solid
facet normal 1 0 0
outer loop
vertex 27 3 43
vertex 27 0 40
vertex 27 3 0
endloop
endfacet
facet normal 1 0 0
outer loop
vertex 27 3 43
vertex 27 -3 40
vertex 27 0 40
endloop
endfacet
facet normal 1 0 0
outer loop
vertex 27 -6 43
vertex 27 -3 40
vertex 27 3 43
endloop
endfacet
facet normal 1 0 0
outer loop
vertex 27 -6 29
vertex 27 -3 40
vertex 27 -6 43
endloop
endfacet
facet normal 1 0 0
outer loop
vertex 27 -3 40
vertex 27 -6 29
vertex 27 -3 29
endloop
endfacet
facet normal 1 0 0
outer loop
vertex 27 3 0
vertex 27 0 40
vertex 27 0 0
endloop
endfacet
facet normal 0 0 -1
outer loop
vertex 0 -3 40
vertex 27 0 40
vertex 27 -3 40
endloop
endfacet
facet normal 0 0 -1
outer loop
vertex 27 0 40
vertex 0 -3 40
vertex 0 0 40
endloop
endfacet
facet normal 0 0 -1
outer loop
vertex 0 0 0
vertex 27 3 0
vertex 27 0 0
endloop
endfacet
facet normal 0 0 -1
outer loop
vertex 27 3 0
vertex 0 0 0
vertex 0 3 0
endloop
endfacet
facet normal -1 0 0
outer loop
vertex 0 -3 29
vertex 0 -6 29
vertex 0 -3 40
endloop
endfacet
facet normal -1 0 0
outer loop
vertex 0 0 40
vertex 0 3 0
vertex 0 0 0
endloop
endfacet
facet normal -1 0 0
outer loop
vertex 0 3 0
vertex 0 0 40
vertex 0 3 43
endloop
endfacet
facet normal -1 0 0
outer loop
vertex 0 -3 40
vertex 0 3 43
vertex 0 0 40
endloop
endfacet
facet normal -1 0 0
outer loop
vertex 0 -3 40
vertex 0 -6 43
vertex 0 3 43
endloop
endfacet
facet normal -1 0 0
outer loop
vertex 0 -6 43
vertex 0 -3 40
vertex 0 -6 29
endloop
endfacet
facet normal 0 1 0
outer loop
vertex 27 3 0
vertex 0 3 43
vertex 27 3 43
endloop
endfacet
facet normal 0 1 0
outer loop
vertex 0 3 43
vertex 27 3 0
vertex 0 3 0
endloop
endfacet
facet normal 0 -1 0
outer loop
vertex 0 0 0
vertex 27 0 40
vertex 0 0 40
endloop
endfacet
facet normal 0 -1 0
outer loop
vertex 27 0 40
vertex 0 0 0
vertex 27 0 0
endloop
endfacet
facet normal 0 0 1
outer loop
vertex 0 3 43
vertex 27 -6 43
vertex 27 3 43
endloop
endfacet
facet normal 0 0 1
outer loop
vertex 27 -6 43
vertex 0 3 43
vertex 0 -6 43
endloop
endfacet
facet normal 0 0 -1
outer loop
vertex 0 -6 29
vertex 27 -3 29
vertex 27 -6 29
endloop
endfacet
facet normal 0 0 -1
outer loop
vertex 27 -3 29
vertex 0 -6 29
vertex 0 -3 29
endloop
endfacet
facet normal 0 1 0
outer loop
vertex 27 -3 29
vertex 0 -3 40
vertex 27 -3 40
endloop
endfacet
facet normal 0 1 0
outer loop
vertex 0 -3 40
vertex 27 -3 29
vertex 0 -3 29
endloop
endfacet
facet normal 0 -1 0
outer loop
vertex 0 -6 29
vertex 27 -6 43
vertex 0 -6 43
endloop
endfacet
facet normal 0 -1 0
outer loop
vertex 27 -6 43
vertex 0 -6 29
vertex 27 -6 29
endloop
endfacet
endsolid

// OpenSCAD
width = 27;
thickness = 3;

cube([width, thickness, 40]);

translate([0,-4,40])
cube([width, 7, thickness]);

translate([0,-6,29])
cube([width, thickness, 14]);
